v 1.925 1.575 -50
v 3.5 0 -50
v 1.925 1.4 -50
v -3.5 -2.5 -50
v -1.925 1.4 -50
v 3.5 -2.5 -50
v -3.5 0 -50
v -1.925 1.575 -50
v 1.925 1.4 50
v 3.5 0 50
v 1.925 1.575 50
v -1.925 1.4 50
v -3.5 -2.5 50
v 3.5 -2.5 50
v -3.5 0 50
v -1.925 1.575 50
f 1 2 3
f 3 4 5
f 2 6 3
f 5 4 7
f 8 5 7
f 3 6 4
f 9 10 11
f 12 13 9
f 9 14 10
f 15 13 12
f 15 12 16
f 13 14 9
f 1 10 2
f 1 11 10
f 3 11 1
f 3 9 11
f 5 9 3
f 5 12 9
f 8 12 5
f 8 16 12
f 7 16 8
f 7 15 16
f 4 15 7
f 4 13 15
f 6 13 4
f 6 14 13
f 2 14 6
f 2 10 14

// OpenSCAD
$fn=64;

rail_w = 7.0;
rail_h = 5.0;
rail_l = 100.0;

module rail_profile(w, h) {
    // Simple linear guide rail profile: rectangular body with two side chamfers and a shallow top groove
    difference() {
        // Base body
        square([w, h], center=true);

        // Side chamfers (45°)
        translate([-(w/2), 0]) rotate(45) square([h*1.2, h*1.2], center=false);
        translate([(w/2), 0]) rotate(45) square([h*1.2, h*1.2], center=false);

        // Top groove
        groove_w = w * 0.55;
        groove_d = h * 0.22;
        translate([0, (h/2) - groove_d/2])
            square([groove_w, groove_d], center=true);
    }
}

module linear_guide_rail(w, h, l) {
    color([0.7,0.7,0.75])
    linear_extrude(height=l, center=true, convexity=10)
        rail_profile(w, h);
}

linear_guide_rail(rail_w, rail_h, rail_l);
